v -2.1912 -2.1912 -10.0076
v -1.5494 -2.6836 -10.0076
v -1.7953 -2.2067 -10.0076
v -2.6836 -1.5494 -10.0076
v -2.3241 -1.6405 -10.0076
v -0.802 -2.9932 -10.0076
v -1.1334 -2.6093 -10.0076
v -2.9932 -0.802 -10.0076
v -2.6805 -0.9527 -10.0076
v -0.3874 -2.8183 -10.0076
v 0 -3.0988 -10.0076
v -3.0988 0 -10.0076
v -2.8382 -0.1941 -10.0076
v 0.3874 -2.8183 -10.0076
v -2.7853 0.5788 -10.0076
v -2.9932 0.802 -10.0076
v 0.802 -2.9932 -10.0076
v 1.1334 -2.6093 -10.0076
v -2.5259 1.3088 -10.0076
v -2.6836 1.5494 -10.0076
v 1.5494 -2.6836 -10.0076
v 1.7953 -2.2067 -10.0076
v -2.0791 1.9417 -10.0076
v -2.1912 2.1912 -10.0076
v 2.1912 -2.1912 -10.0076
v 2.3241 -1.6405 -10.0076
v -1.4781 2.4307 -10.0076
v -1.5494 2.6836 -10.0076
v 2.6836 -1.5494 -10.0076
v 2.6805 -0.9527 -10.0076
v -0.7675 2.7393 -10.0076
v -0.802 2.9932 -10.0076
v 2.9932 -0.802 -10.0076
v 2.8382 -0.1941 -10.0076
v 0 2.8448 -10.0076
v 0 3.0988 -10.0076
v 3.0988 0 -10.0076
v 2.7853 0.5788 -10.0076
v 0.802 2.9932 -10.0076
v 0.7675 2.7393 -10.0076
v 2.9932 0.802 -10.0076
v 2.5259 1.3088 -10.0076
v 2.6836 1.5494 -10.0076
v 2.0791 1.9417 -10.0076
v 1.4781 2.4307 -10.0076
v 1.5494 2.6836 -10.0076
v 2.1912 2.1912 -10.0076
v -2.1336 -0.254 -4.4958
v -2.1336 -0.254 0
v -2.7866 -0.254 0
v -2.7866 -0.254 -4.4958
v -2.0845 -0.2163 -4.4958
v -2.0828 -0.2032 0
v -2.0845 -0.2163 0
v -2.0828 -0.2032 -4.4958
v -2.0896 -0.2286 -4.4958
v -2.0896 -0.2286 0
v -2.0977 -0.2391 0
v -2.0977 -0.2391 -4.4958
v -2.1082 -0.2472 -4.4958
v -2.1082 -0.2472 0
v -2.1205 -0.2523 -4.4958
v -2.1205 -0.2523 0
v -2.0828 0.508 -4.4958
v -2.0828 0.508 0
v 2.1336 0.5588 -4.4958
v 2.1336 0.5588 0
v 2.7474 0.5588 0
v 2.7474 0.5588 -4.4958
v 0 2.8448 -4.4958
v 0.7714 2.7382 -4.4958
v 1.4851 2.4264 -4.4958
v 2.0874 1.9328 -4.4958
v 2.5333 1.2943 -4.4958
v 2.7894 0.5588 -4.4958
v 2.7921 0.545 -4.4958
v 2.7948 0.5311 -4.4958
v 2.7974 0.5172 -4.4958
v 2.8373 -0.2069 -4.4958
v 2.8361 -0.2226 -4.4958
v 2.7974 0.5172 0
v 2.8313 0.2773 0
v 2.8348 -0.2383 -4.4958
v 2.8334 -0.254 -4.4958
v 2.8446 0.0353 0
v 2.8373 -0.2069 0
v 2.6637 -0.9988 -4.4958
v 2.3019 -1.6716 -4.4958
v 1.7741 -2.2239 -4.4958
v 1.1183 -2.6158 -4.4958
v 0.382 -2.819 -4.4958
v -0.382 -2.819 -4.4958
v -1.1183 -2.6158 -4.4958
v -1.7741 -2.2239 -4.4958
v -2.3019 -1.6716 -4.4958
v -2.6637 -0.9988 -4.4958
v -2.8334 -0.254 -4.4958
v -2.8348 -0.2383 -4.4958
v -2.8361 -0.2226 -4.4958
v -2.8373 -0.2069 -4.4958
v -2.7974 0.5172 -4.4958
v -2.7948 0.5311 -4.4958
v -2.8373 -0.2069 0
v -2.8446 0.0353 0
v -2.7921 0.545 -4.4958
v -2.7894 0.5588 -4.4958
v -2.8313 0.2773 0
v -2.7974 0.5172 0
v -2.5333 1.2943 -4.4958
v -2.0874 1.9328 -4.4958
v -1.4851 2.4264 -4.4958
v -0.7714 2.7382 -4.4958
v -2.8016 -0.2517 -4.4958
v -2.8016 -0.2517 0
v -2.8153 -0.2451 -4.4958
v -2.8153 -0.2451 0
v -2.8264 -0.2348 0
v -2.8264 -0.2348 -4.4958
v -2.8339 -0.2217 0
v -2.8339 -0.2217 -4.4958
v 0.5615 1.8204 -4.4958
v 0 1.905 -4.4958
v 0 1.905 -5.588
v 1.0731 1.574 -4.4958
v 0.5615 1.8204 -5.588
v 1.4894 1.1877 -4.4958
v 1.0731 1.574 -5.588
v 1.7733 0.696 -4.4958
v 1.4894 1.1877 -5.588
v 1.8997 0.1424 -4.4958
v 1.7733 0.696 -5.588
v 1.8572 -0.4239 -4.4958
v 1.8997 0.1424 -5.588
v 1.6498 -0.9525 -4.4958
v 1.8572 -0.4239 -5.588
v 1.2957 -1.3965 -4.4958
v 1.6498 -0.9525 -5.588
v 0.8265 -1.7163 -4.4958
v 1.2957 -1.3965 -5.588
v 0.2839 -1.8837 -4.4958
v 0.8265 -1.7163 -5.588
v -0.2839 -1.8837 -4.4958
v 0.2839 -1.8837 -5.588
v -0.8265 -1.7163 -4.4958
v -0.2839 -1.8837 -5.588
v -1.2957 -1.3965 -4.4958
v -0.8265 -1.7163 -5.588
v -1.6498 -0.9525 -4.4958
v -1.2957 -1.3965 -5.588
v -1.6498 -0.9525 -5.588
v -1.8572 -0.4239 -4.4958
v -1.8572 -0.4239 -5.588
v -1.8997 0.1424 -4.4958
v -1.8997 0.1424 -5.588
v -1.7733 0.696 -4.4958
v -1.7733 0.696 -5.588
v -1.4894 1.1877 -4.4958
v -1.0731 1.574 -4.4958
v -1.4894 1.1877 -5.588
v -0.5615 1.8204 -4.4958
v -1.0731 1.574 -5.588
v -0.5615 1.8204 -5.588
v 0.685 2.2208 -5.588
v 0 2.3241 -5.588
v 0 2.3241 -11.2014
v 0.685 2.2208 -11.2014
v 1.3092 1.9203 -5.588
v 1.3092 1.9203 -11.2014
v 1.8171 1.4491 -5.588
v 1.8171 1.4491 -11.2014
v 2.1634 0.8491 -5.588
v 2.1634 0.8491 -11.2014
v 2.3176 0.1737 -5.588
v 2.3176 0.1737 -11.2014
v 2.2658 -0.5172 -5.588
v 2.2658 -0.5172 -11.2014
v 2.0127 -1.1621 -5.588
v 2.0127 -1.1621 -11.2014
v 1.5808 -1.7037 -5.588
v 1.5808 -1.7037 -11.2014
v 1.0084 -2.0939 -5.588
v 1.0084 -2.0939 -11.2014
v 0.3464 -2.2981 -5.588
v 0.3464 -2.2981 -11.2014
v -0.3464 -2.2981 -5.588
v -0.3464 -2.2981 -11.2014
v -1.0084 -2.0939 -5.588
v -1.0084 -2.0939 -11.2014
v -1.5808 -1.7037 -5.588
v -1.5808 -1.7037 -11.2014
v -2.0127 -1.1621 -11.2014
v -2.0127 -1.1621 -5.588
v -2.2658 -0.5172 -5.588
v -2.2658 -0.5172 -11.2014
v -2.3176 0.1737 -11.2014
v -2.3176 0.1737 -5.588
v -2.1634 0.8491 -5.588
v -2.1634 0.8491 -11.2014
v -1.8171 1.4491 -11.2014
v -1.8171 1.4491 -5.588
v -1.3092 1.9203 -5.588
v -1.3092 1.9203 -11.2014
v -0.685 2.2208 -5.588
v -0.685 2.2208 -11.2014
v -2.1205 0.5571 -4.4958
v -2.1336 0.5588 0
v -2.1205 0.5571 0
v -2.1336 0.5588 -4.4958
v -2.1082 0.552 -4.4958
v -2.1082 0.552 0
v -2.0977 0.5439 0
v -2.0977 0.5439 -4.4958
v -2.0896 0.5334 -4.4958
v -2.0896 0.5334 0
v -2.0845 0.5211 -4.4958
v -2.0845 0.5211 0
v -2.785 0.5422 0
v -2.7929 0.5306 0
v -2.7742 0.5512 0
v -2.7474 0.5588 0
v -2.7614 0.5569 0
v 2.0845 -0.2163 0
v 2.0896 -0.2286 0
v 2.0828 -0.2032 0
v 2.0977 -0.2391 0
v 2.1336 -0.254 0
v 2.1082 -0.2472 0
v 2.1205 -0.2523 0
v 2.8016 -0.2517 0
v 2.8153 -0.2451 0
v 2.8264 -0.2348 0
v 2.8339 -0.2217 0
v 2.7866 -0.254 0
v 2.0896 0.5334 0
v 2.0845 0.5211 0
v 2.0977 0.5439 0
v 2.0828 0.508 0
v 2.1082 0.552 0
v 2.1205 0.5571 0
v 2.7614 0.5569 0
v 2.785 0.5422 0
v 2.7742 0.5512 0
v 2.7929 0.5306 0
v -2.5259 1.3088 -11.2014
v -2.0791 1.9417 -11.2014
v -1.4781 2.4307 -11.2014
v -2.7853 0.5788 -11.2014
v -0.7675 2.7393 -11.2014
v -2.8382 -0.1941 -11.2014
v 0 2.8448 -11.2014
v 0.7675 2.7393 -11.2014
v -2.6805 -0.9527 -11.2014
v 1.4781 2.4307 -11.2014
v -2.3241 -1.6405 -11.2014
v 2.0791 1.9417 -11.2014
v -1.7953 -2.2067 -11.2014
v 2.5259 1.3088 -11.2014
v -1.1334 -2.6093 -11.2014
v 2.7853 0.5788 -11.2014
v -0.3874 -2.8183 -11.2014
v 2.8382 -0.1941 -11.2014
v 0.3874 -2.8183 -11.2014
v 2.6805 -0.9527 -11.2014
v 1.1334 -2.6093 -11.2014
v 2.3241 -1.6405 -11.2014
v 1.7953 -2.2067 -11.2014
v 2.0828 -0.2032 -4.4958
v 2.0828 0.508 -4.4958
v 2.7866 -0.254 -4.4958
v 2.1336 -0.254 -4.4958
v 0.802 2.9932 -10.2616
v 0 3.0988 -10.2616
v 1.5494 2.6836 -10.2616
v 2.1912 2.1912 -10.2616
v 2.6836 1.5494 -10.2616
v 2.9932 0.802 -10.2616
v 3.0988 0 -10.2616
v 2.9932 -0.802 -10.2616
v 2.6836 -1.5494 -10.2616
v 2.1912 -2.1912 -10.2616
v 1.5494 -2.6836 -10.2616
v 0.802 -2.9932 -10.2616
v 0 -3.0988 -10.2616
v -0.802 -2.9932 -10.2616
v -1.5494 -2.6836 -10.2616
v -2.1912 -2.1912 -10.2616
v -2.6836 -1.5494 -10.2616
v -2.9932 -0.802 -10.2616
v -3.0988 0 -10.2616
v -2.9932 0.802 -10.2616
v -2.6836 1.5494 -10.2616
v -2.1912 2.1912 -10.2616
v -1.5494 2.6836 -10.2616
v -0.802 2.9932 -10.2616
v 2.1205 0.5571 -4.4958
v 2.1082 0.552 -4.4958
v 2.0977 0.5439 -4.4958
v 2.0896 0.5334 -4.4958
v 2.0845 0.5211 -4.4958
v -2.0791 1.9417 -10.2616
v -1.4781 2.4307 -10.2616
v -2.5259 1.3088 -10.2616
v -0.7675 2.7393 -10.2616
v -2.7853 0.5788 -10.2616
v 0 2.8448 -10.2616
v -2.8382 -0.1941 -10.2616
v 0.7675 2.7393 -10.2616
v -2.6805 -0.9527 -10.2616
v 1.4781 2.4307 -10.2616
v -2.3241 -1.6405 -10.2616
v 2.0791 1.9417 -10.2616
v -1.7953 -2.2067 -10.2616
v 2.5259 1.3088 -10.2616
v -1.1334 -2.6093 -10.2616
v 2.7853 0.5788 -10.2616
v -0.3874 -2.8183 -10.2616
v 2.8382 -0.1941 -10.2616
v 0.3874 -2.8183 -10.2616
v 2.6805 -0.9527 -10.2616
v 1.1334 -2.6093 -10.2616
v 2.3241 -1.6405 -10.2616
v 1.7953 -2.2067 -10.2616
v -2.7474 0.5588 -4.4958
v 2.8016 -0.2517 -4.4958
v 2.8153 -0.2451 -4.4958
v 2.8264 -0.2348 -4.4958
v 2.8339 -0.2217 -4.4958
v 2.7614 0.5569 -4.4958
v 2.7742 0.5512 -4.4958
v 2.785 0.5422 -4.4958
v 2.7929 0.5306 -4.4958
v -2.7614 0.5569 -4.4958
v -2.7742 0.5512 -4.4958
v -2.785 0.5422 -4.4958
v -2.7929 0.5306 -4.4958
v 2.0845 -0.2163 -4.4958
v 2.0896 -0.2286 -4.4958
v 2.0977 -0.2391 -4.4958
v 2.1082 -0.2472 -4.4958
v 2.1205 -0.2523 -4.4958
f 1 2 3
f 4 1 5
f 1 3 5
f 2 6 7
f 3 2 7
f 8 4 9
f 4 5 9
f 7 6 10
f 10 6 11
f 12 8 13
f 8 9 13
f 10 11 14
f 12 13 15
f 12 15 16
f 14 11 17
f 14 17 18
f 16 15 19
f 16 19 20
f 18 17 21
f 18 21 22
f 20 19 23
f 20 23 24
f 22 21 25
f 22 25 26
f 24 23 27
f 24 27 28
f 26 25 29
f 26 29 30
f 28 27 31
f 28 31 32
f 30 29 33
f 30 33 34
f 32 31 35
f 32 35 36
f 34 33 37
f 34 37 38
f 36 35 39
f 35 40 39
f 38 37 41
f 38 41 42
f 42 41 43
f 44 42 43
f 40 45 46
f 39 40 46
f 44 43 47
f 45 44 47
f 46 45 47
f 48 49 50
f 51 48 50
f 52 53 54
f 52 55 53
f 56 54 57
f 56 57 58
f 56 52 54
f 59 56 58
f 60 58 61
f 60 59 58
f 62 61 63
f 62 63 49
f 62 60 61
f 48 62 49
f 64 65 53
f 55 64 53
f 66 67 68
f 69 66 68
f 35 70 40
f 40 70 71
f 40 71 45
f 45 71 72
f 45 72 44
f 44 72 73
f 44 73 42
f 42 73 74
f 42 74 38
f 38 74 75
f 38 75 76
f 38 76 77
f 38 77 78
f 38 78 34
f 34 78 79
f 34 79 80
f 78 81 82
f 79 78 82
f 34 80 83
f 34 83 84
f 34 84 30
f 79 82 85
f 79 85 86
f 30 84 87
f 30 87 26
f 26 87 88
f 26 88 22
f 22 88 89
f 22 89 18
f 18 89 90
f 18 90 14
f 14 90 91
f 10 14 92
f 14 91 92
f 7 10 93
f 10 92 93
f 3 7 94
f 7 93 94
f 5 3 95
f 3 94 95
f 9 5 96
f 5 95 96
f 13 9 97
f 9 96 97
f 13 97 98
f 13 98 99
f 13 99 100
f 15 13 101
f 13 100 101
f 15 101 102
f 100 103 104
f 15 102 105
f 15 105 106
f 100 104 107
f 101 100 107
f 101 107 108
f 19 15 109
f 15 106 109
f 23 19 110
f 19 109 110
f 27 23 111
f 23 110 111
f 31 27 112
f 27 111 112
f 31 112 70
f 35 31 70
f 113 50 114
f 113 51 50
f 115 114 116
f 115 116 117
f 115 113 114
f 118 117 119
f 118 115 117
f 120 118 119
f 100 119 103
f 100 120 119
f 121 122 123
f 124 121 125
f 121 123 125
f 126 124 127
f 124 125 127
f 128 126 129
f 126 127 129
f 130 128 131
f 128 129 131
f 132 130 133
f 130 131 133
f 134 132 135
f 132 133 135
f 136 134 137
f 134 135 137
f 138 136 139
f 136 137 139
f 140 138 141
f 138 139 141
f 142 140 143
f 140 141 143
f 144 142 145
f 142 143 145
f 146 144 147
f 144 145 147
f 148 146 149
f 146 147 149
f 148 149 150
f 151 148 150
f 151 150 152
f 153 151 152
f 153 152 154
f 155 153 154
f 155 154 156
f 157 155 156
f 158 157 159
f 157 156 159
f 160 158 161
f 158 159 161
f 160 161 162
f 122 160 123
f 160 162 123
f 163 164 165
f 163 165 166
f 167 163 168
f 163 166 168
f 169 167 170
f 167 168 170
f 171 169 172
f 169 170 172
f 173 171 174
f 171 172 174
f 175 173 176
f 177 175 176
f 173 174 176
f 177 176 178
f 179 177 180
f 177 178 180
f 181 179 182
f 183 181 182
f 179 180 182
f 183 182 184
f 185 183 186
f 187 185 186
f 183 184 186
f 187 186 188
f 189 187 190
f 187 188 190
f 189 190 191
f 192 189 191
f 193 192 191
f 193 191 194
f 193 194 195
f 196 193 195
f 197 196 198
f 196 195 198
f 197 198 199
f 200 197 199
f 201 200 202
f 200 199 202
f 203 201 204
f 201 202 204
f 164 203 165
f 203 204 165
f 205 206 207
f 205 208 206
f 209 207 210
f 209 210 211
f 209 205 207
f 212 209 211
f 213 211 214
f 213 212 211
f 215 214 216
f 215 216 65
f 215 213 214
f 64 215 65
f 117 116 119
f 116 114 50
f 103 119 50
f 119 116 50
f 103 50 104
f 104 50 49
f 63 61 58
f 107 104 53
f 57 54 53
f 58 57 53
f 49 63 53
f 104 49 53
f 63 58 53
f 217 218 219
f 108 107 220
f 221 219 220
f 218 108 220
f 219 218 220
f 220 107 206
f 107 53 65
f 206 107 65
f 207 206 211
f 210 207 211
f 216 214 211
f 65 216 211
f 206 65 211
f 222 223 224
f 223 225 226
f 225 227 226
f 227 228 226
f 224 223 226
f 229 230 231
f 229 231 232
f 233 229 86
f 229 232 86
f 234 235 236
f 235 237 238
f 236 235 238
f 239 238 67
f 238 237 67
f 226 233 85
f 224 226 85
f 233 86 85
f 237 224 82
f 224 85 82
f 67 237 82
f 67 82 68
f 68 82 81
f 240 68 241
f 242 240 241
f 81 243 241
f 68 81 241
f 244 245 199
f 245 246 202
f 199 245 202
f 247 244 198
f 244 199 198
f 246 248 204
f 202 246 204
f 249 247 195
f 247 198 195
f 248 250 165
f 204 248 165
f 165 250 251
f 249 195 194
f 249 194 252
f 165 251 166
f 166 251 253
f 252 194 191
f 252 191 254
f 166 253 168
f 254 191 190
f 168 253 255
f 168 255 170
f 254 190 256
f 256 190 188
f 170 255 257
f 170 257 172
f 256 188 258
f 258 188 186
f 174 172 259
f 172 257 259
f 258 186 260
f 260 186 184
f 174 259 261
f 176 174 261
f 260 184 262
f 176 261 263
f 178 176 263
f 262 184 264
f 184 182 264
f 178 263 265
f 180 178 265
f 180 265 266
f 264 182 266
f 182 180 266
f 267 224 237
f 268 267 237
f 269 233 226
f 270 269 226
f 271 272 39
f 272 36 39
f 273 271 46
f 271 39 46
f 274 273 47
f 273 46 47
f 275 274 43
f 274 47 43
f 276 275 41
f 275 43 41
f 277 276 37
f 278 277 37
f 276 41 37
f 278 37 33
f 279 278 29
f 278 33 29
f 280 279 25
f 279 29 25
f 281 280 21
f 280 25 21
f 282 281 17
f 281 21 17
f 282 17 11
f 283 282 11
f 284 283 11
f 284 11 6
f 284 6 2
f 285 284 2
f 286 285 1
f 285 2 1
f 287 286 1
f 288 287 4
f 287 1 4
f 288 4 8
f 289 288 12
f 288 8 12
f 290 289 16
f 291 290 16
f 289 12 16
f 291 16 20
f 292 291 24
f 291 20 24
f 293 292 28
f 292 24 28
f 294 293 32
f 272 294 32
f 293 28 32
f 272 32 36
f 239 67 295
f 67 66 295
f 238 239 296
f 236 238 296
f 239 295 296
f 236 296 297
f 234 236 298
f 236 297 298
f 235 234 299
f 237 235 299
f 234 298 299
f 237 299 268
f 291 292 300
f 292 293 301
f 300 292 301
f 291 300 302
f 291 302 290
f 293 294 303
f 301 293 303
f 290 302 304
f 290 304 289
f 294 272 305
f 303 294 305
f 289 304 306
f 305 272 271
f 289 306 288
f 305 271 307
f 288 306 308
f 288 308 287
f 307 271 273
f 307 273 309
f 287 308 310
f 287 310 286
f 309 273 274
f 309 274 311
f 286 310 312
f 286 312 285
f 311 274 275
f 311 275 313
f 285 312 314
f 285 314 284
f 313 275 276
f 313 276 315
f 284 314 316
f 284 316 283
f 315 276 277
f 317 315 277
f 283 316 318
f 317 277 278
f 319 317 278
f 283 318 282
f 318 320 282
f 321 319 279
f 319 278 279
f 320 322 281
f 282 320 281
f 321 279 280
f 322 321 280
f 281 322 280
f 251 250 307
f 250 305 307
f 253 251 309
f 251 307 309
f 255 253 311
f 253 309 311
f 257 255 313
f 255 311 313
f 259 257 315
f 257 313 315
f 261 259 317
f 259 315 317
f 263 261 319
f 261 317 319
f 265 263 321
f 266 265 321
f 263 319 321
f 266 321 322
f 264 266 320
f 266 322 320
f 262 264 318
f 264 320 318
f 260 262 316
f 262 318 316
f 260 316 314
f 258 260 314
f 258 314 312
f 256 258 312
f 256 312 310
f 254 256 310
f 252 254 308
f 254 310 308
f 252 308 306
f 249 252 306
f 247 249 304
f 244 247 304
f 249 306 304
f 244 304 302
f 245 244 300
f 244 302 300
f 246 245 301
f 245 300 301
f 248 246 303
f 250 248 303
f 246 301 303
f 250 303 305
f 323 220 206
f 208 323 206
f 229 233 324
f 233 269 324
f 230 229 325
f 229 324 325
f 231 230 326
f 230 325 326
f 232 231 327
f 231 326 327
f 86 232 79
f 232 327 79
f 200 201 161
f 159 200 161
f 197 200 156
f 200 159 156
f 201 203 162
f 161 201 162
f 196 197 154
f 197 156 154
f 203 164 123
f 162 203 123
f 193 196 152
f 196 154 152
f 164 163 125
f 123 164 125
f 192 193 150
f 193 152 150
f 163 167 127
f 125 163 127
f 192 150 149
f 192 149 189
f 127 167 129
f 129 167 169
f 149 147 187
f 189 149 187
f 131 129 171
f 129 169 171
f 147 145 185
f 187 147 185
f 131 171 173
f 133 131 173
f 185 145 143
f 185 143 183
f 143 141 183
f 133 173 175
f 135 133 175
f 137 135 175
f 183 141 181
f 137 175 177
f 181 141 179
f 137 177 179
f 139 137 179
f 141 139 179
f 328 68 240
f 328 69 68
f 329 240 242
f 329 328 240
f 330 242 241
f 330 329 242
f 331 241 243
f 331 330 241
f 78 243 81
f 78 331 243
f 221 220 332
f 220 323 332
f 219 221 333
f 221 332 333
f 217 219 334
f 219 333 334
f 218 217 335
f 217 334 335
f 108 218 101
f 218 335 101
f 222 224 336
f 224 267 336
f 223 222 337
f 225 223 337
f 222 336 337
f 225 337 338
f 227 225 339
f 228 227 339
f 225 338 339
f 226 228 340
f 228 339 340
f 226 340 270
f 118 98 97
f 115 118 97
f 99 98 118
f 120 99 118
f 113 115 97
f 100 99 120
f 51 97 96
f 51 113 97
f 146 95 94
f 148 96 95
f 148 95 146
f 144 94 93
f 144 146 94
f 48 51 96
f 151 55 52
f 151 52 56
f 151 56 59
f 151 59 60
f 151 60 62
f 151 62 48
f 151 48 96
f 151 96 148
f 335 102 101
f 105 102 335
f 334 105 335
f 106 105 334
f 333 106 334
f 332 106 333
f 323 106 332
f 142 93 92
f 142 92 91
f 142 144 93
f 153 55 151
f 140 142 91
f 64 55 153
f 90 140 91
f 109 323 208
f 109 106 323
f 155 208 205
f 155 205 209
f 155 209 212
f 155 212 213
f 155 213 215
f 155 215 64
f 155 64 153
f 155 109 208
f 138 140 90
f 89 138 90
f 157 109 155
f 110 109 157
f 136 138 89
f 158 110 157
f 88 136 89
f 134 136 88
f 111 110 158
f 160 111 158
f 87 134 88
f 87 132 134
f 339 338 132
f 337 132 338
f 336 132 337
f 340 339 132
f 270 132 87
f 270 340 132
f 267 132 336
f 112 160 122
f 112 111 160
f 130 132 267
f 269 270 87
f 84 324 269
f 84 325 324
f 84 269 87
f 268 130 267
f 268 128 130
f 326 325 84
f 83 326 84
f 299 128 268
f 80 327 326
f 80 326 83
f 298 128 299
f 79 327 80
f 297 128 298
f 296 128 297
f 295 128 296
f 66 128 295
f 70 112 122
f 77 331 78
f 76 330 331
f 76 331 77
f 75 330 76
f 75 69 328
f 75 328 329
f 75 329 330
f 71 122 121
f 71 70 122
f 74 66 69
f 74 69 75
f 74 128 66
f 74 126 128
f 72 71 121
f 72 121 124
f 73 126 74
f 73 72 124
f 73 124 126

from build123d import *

# Parameters (mm, degrees)
F2_R     = 1.905
F3_DEPTH = 4.4958
F4_R     = 0.0508


with BuildPart() as f1:
    # F0 (on Right) → F1 (revolve)
    with BuildSketch(Plane.YZ):
        Polygon((2.8448, 0), (1.905, 0), (1.905, -5.588), (2.3241, -5.588), (2.3241, -11.2014), (2.8448, -11.2014), (2.8448, -10.2616), (3.0988, -10.2616), (3.0988, -10.0076), (2.8448, -10.0076), align=None)
    revolve(axis=Axis((0, 0, -5.6007), (0, 0, -1)))

    # F2 (on face) → F3 (cut)
    with BuildSketch(Plane.XY):
        with BuildLine():
            ThreePointArc((2.7893779952, 0.5588), (0, 2.8448), (-2.7893779952, 0.5588))
            Line((-2.7893779952, 0.5588), (-2.0828, 0.5588))
            Line((-2.0828, 0.5588), (-2.0828, -0.254))
            Line((-2.0828, -0.254), (-2.8334380247, -0.254))
            ThreePointArc((-2.8334380247, -0.254), (0, -2.8448), (2.8334380247, -0.254))
            Line((2.8334380247, -0.254), (2.0828, -0.254))
            Line((2.0828, -0.254), (2.0828, 0.5588))
            Line((2.0828, 0.5588), (2.7893779952, 0.5588))
        make_face()
        Circle(F2_R, mode=Mode.SUBTRACT)
    extrude(amount=-F3_DEPTH, mode=Mode.SUBTRACT)

    # F4
    f4_edges = [f1.edges().sort_by_distance(p)[0] for p in [
        (-2.789378, 0.5588, -2.2479),
        (-2.0828, 0.5588, -2.2479),
        (-2.0828, -0.254, -2.2479),
        (-2.833438, -0.254, -2.2479),
        (2.0828, -0.254, -2.2479),
        (2.833438, -0.254, -2.2479),
        (2.789378, 0.5588, -2.2479),
        (2.0828, 0.5588, -2.2479),
    ]]
    fillet(f4_edges, radius=F4_R)


solid = f1.part
